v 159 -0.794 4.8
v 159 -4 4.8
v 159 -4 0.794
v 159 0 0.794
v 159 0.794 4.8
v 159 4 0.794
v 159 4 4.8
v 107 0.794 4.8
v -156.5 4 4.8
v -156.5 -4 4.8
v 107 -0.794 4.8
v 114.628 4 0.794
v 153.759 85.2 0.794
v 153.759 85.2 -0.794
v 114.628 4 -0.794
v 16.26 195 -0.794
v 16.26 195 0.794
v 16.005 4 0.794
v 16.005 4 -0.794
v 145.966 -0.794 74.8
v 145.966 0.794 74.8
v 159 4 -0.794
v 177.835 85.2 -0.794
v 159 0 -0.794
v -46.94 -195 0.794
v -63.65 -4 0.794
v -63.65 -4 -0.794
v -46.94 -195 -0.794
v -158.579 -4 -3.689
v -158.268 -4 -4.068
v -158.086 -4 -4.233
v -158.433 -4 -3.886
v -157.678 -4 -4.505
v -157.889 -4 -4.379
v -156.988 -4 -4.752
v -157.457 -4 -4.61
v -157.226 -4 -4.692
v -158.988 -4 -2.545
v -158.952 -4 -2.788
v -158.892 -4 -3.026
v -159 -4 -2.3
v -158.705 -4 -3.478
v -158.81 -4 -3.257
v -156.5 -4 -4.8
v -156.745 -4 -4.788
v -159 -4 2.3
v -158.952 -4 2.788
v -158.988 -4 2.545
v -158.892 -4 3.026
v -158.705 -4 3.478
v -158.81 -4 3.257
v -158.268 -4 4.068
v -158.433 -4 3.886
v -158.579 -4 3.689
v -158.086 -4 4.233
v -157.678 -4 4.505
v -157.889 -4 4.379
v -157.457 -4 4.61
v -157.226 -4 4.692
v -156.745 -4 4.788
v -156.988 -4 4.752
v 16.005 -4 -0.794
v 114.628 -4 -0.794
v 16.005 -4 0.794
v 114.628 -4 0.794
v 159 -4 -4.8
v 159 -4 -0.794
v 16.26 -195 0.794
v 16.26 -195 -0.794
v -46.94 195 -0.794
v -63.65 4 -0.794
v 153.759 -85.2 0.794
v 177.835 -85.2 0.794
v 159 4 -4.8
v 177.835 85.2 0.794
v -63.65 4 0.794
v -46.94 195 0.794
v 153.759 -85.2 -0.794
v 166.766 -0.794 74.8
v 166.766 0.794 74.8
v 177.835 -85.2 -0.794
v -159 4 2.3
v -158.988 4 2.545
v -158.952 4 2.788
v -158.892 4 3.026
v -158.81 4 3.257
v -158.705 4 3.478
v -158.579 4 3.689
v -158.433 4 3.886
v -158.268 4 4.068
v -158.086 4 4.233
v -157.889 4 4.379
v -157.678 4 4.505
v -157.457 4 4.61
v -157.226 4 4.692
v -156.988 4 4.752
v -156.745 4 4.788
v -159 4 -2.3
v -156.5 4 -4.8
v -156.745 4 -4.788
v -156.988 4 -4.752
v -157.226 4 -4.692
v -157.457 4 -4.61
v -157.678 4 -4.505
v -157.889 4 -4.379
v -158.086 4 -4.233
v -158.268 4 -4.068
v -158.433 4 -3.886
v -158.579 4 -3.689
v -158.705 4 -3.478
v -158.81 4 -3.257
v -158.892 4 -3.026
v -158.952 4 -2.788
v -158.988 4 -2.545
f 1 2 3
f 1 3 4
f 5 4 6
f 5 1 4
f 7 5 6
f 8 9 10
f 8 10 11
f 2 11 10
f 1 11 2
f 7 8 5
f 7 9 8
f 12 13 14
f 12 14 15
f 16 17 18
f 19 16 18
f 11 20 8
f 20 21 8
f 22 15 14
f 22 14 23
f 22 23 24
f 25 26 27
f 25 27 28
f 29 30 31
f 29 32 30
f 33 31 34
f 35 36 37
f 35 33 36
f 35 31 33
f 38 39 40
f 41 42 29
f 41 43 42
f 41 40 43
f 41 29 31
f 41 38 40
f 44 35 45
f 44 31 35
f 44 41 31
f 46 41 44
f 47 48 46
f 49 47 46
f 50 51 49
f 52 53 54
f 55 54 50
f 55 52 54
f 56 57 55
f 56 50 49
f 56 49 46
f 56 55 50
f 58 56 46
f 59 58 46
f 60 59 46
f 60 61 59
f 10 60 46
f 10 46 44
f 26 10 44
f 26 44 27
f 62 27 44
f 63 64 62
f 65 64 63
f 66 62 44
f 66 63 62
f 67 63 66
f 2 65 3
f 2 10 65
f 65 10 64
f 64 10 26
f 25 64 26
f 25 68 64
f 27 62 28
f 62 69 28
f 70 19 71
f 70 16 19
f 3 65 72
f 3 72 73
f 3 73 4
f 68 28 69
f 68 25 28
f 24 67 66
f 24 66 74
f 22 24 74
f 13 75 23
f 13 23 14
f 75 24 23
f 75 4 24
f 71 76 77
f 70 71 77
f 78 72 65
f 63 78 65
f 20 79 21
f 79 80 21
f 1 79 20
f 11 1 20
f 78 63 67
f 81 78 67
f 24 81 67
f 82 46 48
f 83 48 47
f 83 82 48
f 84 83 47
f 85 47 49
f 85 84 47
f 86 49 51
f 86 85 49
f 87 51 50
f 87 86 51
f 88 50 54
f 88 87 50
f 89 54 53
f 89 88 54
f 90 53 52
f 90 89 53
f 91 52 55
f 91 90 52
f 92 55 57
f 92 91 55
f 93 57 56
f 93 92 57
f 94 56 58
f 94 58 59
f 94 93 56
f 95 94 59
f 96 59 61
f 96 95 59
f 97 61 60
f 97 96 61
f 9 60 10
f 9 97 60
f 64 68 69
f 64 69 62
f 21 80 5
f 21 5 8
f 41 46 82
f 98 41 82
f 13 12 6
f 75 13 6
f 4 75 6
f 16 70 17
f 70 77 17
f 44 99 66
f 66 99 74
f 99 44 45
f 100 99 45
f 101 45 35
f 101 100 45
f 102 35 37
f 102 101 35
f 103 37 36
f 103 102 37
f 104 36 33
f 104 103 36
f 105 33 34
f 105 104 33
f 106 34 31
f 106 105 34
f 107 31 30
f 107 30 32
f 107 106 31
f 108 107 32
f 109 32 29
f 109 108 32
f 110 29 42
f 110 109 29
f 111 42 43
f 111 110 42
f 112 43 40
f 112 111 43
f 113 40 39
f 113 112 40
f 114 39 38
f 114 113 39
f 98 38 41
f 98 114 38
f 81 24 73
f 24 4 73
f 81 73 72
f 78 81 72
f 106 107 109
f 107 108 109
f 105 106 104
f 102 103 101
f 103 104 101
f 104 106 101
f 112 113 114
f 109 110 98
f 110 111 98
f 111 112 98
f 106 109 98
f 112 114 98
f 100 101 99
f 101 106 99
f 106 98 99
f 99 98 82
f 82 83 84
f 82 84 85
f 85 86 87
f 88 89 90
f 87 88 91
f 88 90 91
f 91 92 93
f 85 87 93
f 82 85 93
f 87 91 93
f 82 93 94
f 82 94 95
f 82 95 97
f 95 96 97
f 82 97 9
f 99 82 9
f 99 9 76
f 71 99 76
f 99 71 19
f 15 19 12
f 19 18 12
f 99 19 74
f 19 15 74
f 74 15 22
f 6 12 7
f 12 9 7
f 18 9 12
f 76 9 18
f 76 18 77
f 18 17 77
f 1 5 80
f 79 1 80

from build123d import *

# Parameters (mm, degrees)
SKETCH1_W           = 318
SKETCH1_H           = 8
BOSS_EXTRUDE1_DEPTH = 4.8
BOSS_EXTRUDE2_DEPTH = 0.79375
BOSS_EXTRUDE3_DEPTH = 0.79375
BOSS_EXTRUDE4_DEPTH = 0.79375
FILLET1_R           = 2.5


with BuildPart() as part:
    # Sketch1 → Boss-Extrude1 (new, symmetric)
    with BuildSketch(Plane.XY):
        Rectangle(SKETCH1_W, SKETCH1_H)
    extrude(amount=BOSS_EXTRUDE1_DEPTH, both=True)

    # Sketch3 → Boss-Extrude2 (add, symmetric)
    with BuildSketch(Plane.XY):
        Polygon((-64, 0), (-46.939710612, 195), (16.260289388, 195), (16, 0), align=None)
    boss_extrude2 = extrude(amount=BOSS_EXTRUDE2_DEPTH, both=True)

    # Mirror1: Boss-Extrude2 across plane
    add(boss_extrude2.mirror(Plane.ZX))

    # Sketch6 → Boss-Extrude3 (add, symmetric)
    with BuildSketch(Plane(origin=(0, 0, 0), x_dir=(1, 0, 0), z_dir=(0, 1, 0))):
        Polygon((159, -4.8), (166.766007972, -74.8), (145.966007972, -74.8), (107, -4.8), align=None)
    extrude(amount=BOSS_EXTRUDE3_DEPTH, both=True)

    # Sketch8 → Boss-Extrude4 (add, symmetric)
    with BuildSketch(Plane.XY):
        Polygon((159, 0), (177.834948036, 85.2), (153.758948036, 85.2), (112.7, 0), align=None)
    boss_extrude4 = extrude(amount=BOSS_EXTRUDE4_DEPTH, both=True)

    # Mirror2: Boss-Extrude4 across plane
    add(boss_extrude4.mirror(Plane.ZX))

    # Fillet1
    fillet1_edges = [part.edges().sort_by_distance(p)[0] for p in [
        (-159, 0, 4.8),
        (-159, 0, -4.8),
    ]]
    fillet(fillet1_edges, radius=FILLET1_R)


solid = part.part
